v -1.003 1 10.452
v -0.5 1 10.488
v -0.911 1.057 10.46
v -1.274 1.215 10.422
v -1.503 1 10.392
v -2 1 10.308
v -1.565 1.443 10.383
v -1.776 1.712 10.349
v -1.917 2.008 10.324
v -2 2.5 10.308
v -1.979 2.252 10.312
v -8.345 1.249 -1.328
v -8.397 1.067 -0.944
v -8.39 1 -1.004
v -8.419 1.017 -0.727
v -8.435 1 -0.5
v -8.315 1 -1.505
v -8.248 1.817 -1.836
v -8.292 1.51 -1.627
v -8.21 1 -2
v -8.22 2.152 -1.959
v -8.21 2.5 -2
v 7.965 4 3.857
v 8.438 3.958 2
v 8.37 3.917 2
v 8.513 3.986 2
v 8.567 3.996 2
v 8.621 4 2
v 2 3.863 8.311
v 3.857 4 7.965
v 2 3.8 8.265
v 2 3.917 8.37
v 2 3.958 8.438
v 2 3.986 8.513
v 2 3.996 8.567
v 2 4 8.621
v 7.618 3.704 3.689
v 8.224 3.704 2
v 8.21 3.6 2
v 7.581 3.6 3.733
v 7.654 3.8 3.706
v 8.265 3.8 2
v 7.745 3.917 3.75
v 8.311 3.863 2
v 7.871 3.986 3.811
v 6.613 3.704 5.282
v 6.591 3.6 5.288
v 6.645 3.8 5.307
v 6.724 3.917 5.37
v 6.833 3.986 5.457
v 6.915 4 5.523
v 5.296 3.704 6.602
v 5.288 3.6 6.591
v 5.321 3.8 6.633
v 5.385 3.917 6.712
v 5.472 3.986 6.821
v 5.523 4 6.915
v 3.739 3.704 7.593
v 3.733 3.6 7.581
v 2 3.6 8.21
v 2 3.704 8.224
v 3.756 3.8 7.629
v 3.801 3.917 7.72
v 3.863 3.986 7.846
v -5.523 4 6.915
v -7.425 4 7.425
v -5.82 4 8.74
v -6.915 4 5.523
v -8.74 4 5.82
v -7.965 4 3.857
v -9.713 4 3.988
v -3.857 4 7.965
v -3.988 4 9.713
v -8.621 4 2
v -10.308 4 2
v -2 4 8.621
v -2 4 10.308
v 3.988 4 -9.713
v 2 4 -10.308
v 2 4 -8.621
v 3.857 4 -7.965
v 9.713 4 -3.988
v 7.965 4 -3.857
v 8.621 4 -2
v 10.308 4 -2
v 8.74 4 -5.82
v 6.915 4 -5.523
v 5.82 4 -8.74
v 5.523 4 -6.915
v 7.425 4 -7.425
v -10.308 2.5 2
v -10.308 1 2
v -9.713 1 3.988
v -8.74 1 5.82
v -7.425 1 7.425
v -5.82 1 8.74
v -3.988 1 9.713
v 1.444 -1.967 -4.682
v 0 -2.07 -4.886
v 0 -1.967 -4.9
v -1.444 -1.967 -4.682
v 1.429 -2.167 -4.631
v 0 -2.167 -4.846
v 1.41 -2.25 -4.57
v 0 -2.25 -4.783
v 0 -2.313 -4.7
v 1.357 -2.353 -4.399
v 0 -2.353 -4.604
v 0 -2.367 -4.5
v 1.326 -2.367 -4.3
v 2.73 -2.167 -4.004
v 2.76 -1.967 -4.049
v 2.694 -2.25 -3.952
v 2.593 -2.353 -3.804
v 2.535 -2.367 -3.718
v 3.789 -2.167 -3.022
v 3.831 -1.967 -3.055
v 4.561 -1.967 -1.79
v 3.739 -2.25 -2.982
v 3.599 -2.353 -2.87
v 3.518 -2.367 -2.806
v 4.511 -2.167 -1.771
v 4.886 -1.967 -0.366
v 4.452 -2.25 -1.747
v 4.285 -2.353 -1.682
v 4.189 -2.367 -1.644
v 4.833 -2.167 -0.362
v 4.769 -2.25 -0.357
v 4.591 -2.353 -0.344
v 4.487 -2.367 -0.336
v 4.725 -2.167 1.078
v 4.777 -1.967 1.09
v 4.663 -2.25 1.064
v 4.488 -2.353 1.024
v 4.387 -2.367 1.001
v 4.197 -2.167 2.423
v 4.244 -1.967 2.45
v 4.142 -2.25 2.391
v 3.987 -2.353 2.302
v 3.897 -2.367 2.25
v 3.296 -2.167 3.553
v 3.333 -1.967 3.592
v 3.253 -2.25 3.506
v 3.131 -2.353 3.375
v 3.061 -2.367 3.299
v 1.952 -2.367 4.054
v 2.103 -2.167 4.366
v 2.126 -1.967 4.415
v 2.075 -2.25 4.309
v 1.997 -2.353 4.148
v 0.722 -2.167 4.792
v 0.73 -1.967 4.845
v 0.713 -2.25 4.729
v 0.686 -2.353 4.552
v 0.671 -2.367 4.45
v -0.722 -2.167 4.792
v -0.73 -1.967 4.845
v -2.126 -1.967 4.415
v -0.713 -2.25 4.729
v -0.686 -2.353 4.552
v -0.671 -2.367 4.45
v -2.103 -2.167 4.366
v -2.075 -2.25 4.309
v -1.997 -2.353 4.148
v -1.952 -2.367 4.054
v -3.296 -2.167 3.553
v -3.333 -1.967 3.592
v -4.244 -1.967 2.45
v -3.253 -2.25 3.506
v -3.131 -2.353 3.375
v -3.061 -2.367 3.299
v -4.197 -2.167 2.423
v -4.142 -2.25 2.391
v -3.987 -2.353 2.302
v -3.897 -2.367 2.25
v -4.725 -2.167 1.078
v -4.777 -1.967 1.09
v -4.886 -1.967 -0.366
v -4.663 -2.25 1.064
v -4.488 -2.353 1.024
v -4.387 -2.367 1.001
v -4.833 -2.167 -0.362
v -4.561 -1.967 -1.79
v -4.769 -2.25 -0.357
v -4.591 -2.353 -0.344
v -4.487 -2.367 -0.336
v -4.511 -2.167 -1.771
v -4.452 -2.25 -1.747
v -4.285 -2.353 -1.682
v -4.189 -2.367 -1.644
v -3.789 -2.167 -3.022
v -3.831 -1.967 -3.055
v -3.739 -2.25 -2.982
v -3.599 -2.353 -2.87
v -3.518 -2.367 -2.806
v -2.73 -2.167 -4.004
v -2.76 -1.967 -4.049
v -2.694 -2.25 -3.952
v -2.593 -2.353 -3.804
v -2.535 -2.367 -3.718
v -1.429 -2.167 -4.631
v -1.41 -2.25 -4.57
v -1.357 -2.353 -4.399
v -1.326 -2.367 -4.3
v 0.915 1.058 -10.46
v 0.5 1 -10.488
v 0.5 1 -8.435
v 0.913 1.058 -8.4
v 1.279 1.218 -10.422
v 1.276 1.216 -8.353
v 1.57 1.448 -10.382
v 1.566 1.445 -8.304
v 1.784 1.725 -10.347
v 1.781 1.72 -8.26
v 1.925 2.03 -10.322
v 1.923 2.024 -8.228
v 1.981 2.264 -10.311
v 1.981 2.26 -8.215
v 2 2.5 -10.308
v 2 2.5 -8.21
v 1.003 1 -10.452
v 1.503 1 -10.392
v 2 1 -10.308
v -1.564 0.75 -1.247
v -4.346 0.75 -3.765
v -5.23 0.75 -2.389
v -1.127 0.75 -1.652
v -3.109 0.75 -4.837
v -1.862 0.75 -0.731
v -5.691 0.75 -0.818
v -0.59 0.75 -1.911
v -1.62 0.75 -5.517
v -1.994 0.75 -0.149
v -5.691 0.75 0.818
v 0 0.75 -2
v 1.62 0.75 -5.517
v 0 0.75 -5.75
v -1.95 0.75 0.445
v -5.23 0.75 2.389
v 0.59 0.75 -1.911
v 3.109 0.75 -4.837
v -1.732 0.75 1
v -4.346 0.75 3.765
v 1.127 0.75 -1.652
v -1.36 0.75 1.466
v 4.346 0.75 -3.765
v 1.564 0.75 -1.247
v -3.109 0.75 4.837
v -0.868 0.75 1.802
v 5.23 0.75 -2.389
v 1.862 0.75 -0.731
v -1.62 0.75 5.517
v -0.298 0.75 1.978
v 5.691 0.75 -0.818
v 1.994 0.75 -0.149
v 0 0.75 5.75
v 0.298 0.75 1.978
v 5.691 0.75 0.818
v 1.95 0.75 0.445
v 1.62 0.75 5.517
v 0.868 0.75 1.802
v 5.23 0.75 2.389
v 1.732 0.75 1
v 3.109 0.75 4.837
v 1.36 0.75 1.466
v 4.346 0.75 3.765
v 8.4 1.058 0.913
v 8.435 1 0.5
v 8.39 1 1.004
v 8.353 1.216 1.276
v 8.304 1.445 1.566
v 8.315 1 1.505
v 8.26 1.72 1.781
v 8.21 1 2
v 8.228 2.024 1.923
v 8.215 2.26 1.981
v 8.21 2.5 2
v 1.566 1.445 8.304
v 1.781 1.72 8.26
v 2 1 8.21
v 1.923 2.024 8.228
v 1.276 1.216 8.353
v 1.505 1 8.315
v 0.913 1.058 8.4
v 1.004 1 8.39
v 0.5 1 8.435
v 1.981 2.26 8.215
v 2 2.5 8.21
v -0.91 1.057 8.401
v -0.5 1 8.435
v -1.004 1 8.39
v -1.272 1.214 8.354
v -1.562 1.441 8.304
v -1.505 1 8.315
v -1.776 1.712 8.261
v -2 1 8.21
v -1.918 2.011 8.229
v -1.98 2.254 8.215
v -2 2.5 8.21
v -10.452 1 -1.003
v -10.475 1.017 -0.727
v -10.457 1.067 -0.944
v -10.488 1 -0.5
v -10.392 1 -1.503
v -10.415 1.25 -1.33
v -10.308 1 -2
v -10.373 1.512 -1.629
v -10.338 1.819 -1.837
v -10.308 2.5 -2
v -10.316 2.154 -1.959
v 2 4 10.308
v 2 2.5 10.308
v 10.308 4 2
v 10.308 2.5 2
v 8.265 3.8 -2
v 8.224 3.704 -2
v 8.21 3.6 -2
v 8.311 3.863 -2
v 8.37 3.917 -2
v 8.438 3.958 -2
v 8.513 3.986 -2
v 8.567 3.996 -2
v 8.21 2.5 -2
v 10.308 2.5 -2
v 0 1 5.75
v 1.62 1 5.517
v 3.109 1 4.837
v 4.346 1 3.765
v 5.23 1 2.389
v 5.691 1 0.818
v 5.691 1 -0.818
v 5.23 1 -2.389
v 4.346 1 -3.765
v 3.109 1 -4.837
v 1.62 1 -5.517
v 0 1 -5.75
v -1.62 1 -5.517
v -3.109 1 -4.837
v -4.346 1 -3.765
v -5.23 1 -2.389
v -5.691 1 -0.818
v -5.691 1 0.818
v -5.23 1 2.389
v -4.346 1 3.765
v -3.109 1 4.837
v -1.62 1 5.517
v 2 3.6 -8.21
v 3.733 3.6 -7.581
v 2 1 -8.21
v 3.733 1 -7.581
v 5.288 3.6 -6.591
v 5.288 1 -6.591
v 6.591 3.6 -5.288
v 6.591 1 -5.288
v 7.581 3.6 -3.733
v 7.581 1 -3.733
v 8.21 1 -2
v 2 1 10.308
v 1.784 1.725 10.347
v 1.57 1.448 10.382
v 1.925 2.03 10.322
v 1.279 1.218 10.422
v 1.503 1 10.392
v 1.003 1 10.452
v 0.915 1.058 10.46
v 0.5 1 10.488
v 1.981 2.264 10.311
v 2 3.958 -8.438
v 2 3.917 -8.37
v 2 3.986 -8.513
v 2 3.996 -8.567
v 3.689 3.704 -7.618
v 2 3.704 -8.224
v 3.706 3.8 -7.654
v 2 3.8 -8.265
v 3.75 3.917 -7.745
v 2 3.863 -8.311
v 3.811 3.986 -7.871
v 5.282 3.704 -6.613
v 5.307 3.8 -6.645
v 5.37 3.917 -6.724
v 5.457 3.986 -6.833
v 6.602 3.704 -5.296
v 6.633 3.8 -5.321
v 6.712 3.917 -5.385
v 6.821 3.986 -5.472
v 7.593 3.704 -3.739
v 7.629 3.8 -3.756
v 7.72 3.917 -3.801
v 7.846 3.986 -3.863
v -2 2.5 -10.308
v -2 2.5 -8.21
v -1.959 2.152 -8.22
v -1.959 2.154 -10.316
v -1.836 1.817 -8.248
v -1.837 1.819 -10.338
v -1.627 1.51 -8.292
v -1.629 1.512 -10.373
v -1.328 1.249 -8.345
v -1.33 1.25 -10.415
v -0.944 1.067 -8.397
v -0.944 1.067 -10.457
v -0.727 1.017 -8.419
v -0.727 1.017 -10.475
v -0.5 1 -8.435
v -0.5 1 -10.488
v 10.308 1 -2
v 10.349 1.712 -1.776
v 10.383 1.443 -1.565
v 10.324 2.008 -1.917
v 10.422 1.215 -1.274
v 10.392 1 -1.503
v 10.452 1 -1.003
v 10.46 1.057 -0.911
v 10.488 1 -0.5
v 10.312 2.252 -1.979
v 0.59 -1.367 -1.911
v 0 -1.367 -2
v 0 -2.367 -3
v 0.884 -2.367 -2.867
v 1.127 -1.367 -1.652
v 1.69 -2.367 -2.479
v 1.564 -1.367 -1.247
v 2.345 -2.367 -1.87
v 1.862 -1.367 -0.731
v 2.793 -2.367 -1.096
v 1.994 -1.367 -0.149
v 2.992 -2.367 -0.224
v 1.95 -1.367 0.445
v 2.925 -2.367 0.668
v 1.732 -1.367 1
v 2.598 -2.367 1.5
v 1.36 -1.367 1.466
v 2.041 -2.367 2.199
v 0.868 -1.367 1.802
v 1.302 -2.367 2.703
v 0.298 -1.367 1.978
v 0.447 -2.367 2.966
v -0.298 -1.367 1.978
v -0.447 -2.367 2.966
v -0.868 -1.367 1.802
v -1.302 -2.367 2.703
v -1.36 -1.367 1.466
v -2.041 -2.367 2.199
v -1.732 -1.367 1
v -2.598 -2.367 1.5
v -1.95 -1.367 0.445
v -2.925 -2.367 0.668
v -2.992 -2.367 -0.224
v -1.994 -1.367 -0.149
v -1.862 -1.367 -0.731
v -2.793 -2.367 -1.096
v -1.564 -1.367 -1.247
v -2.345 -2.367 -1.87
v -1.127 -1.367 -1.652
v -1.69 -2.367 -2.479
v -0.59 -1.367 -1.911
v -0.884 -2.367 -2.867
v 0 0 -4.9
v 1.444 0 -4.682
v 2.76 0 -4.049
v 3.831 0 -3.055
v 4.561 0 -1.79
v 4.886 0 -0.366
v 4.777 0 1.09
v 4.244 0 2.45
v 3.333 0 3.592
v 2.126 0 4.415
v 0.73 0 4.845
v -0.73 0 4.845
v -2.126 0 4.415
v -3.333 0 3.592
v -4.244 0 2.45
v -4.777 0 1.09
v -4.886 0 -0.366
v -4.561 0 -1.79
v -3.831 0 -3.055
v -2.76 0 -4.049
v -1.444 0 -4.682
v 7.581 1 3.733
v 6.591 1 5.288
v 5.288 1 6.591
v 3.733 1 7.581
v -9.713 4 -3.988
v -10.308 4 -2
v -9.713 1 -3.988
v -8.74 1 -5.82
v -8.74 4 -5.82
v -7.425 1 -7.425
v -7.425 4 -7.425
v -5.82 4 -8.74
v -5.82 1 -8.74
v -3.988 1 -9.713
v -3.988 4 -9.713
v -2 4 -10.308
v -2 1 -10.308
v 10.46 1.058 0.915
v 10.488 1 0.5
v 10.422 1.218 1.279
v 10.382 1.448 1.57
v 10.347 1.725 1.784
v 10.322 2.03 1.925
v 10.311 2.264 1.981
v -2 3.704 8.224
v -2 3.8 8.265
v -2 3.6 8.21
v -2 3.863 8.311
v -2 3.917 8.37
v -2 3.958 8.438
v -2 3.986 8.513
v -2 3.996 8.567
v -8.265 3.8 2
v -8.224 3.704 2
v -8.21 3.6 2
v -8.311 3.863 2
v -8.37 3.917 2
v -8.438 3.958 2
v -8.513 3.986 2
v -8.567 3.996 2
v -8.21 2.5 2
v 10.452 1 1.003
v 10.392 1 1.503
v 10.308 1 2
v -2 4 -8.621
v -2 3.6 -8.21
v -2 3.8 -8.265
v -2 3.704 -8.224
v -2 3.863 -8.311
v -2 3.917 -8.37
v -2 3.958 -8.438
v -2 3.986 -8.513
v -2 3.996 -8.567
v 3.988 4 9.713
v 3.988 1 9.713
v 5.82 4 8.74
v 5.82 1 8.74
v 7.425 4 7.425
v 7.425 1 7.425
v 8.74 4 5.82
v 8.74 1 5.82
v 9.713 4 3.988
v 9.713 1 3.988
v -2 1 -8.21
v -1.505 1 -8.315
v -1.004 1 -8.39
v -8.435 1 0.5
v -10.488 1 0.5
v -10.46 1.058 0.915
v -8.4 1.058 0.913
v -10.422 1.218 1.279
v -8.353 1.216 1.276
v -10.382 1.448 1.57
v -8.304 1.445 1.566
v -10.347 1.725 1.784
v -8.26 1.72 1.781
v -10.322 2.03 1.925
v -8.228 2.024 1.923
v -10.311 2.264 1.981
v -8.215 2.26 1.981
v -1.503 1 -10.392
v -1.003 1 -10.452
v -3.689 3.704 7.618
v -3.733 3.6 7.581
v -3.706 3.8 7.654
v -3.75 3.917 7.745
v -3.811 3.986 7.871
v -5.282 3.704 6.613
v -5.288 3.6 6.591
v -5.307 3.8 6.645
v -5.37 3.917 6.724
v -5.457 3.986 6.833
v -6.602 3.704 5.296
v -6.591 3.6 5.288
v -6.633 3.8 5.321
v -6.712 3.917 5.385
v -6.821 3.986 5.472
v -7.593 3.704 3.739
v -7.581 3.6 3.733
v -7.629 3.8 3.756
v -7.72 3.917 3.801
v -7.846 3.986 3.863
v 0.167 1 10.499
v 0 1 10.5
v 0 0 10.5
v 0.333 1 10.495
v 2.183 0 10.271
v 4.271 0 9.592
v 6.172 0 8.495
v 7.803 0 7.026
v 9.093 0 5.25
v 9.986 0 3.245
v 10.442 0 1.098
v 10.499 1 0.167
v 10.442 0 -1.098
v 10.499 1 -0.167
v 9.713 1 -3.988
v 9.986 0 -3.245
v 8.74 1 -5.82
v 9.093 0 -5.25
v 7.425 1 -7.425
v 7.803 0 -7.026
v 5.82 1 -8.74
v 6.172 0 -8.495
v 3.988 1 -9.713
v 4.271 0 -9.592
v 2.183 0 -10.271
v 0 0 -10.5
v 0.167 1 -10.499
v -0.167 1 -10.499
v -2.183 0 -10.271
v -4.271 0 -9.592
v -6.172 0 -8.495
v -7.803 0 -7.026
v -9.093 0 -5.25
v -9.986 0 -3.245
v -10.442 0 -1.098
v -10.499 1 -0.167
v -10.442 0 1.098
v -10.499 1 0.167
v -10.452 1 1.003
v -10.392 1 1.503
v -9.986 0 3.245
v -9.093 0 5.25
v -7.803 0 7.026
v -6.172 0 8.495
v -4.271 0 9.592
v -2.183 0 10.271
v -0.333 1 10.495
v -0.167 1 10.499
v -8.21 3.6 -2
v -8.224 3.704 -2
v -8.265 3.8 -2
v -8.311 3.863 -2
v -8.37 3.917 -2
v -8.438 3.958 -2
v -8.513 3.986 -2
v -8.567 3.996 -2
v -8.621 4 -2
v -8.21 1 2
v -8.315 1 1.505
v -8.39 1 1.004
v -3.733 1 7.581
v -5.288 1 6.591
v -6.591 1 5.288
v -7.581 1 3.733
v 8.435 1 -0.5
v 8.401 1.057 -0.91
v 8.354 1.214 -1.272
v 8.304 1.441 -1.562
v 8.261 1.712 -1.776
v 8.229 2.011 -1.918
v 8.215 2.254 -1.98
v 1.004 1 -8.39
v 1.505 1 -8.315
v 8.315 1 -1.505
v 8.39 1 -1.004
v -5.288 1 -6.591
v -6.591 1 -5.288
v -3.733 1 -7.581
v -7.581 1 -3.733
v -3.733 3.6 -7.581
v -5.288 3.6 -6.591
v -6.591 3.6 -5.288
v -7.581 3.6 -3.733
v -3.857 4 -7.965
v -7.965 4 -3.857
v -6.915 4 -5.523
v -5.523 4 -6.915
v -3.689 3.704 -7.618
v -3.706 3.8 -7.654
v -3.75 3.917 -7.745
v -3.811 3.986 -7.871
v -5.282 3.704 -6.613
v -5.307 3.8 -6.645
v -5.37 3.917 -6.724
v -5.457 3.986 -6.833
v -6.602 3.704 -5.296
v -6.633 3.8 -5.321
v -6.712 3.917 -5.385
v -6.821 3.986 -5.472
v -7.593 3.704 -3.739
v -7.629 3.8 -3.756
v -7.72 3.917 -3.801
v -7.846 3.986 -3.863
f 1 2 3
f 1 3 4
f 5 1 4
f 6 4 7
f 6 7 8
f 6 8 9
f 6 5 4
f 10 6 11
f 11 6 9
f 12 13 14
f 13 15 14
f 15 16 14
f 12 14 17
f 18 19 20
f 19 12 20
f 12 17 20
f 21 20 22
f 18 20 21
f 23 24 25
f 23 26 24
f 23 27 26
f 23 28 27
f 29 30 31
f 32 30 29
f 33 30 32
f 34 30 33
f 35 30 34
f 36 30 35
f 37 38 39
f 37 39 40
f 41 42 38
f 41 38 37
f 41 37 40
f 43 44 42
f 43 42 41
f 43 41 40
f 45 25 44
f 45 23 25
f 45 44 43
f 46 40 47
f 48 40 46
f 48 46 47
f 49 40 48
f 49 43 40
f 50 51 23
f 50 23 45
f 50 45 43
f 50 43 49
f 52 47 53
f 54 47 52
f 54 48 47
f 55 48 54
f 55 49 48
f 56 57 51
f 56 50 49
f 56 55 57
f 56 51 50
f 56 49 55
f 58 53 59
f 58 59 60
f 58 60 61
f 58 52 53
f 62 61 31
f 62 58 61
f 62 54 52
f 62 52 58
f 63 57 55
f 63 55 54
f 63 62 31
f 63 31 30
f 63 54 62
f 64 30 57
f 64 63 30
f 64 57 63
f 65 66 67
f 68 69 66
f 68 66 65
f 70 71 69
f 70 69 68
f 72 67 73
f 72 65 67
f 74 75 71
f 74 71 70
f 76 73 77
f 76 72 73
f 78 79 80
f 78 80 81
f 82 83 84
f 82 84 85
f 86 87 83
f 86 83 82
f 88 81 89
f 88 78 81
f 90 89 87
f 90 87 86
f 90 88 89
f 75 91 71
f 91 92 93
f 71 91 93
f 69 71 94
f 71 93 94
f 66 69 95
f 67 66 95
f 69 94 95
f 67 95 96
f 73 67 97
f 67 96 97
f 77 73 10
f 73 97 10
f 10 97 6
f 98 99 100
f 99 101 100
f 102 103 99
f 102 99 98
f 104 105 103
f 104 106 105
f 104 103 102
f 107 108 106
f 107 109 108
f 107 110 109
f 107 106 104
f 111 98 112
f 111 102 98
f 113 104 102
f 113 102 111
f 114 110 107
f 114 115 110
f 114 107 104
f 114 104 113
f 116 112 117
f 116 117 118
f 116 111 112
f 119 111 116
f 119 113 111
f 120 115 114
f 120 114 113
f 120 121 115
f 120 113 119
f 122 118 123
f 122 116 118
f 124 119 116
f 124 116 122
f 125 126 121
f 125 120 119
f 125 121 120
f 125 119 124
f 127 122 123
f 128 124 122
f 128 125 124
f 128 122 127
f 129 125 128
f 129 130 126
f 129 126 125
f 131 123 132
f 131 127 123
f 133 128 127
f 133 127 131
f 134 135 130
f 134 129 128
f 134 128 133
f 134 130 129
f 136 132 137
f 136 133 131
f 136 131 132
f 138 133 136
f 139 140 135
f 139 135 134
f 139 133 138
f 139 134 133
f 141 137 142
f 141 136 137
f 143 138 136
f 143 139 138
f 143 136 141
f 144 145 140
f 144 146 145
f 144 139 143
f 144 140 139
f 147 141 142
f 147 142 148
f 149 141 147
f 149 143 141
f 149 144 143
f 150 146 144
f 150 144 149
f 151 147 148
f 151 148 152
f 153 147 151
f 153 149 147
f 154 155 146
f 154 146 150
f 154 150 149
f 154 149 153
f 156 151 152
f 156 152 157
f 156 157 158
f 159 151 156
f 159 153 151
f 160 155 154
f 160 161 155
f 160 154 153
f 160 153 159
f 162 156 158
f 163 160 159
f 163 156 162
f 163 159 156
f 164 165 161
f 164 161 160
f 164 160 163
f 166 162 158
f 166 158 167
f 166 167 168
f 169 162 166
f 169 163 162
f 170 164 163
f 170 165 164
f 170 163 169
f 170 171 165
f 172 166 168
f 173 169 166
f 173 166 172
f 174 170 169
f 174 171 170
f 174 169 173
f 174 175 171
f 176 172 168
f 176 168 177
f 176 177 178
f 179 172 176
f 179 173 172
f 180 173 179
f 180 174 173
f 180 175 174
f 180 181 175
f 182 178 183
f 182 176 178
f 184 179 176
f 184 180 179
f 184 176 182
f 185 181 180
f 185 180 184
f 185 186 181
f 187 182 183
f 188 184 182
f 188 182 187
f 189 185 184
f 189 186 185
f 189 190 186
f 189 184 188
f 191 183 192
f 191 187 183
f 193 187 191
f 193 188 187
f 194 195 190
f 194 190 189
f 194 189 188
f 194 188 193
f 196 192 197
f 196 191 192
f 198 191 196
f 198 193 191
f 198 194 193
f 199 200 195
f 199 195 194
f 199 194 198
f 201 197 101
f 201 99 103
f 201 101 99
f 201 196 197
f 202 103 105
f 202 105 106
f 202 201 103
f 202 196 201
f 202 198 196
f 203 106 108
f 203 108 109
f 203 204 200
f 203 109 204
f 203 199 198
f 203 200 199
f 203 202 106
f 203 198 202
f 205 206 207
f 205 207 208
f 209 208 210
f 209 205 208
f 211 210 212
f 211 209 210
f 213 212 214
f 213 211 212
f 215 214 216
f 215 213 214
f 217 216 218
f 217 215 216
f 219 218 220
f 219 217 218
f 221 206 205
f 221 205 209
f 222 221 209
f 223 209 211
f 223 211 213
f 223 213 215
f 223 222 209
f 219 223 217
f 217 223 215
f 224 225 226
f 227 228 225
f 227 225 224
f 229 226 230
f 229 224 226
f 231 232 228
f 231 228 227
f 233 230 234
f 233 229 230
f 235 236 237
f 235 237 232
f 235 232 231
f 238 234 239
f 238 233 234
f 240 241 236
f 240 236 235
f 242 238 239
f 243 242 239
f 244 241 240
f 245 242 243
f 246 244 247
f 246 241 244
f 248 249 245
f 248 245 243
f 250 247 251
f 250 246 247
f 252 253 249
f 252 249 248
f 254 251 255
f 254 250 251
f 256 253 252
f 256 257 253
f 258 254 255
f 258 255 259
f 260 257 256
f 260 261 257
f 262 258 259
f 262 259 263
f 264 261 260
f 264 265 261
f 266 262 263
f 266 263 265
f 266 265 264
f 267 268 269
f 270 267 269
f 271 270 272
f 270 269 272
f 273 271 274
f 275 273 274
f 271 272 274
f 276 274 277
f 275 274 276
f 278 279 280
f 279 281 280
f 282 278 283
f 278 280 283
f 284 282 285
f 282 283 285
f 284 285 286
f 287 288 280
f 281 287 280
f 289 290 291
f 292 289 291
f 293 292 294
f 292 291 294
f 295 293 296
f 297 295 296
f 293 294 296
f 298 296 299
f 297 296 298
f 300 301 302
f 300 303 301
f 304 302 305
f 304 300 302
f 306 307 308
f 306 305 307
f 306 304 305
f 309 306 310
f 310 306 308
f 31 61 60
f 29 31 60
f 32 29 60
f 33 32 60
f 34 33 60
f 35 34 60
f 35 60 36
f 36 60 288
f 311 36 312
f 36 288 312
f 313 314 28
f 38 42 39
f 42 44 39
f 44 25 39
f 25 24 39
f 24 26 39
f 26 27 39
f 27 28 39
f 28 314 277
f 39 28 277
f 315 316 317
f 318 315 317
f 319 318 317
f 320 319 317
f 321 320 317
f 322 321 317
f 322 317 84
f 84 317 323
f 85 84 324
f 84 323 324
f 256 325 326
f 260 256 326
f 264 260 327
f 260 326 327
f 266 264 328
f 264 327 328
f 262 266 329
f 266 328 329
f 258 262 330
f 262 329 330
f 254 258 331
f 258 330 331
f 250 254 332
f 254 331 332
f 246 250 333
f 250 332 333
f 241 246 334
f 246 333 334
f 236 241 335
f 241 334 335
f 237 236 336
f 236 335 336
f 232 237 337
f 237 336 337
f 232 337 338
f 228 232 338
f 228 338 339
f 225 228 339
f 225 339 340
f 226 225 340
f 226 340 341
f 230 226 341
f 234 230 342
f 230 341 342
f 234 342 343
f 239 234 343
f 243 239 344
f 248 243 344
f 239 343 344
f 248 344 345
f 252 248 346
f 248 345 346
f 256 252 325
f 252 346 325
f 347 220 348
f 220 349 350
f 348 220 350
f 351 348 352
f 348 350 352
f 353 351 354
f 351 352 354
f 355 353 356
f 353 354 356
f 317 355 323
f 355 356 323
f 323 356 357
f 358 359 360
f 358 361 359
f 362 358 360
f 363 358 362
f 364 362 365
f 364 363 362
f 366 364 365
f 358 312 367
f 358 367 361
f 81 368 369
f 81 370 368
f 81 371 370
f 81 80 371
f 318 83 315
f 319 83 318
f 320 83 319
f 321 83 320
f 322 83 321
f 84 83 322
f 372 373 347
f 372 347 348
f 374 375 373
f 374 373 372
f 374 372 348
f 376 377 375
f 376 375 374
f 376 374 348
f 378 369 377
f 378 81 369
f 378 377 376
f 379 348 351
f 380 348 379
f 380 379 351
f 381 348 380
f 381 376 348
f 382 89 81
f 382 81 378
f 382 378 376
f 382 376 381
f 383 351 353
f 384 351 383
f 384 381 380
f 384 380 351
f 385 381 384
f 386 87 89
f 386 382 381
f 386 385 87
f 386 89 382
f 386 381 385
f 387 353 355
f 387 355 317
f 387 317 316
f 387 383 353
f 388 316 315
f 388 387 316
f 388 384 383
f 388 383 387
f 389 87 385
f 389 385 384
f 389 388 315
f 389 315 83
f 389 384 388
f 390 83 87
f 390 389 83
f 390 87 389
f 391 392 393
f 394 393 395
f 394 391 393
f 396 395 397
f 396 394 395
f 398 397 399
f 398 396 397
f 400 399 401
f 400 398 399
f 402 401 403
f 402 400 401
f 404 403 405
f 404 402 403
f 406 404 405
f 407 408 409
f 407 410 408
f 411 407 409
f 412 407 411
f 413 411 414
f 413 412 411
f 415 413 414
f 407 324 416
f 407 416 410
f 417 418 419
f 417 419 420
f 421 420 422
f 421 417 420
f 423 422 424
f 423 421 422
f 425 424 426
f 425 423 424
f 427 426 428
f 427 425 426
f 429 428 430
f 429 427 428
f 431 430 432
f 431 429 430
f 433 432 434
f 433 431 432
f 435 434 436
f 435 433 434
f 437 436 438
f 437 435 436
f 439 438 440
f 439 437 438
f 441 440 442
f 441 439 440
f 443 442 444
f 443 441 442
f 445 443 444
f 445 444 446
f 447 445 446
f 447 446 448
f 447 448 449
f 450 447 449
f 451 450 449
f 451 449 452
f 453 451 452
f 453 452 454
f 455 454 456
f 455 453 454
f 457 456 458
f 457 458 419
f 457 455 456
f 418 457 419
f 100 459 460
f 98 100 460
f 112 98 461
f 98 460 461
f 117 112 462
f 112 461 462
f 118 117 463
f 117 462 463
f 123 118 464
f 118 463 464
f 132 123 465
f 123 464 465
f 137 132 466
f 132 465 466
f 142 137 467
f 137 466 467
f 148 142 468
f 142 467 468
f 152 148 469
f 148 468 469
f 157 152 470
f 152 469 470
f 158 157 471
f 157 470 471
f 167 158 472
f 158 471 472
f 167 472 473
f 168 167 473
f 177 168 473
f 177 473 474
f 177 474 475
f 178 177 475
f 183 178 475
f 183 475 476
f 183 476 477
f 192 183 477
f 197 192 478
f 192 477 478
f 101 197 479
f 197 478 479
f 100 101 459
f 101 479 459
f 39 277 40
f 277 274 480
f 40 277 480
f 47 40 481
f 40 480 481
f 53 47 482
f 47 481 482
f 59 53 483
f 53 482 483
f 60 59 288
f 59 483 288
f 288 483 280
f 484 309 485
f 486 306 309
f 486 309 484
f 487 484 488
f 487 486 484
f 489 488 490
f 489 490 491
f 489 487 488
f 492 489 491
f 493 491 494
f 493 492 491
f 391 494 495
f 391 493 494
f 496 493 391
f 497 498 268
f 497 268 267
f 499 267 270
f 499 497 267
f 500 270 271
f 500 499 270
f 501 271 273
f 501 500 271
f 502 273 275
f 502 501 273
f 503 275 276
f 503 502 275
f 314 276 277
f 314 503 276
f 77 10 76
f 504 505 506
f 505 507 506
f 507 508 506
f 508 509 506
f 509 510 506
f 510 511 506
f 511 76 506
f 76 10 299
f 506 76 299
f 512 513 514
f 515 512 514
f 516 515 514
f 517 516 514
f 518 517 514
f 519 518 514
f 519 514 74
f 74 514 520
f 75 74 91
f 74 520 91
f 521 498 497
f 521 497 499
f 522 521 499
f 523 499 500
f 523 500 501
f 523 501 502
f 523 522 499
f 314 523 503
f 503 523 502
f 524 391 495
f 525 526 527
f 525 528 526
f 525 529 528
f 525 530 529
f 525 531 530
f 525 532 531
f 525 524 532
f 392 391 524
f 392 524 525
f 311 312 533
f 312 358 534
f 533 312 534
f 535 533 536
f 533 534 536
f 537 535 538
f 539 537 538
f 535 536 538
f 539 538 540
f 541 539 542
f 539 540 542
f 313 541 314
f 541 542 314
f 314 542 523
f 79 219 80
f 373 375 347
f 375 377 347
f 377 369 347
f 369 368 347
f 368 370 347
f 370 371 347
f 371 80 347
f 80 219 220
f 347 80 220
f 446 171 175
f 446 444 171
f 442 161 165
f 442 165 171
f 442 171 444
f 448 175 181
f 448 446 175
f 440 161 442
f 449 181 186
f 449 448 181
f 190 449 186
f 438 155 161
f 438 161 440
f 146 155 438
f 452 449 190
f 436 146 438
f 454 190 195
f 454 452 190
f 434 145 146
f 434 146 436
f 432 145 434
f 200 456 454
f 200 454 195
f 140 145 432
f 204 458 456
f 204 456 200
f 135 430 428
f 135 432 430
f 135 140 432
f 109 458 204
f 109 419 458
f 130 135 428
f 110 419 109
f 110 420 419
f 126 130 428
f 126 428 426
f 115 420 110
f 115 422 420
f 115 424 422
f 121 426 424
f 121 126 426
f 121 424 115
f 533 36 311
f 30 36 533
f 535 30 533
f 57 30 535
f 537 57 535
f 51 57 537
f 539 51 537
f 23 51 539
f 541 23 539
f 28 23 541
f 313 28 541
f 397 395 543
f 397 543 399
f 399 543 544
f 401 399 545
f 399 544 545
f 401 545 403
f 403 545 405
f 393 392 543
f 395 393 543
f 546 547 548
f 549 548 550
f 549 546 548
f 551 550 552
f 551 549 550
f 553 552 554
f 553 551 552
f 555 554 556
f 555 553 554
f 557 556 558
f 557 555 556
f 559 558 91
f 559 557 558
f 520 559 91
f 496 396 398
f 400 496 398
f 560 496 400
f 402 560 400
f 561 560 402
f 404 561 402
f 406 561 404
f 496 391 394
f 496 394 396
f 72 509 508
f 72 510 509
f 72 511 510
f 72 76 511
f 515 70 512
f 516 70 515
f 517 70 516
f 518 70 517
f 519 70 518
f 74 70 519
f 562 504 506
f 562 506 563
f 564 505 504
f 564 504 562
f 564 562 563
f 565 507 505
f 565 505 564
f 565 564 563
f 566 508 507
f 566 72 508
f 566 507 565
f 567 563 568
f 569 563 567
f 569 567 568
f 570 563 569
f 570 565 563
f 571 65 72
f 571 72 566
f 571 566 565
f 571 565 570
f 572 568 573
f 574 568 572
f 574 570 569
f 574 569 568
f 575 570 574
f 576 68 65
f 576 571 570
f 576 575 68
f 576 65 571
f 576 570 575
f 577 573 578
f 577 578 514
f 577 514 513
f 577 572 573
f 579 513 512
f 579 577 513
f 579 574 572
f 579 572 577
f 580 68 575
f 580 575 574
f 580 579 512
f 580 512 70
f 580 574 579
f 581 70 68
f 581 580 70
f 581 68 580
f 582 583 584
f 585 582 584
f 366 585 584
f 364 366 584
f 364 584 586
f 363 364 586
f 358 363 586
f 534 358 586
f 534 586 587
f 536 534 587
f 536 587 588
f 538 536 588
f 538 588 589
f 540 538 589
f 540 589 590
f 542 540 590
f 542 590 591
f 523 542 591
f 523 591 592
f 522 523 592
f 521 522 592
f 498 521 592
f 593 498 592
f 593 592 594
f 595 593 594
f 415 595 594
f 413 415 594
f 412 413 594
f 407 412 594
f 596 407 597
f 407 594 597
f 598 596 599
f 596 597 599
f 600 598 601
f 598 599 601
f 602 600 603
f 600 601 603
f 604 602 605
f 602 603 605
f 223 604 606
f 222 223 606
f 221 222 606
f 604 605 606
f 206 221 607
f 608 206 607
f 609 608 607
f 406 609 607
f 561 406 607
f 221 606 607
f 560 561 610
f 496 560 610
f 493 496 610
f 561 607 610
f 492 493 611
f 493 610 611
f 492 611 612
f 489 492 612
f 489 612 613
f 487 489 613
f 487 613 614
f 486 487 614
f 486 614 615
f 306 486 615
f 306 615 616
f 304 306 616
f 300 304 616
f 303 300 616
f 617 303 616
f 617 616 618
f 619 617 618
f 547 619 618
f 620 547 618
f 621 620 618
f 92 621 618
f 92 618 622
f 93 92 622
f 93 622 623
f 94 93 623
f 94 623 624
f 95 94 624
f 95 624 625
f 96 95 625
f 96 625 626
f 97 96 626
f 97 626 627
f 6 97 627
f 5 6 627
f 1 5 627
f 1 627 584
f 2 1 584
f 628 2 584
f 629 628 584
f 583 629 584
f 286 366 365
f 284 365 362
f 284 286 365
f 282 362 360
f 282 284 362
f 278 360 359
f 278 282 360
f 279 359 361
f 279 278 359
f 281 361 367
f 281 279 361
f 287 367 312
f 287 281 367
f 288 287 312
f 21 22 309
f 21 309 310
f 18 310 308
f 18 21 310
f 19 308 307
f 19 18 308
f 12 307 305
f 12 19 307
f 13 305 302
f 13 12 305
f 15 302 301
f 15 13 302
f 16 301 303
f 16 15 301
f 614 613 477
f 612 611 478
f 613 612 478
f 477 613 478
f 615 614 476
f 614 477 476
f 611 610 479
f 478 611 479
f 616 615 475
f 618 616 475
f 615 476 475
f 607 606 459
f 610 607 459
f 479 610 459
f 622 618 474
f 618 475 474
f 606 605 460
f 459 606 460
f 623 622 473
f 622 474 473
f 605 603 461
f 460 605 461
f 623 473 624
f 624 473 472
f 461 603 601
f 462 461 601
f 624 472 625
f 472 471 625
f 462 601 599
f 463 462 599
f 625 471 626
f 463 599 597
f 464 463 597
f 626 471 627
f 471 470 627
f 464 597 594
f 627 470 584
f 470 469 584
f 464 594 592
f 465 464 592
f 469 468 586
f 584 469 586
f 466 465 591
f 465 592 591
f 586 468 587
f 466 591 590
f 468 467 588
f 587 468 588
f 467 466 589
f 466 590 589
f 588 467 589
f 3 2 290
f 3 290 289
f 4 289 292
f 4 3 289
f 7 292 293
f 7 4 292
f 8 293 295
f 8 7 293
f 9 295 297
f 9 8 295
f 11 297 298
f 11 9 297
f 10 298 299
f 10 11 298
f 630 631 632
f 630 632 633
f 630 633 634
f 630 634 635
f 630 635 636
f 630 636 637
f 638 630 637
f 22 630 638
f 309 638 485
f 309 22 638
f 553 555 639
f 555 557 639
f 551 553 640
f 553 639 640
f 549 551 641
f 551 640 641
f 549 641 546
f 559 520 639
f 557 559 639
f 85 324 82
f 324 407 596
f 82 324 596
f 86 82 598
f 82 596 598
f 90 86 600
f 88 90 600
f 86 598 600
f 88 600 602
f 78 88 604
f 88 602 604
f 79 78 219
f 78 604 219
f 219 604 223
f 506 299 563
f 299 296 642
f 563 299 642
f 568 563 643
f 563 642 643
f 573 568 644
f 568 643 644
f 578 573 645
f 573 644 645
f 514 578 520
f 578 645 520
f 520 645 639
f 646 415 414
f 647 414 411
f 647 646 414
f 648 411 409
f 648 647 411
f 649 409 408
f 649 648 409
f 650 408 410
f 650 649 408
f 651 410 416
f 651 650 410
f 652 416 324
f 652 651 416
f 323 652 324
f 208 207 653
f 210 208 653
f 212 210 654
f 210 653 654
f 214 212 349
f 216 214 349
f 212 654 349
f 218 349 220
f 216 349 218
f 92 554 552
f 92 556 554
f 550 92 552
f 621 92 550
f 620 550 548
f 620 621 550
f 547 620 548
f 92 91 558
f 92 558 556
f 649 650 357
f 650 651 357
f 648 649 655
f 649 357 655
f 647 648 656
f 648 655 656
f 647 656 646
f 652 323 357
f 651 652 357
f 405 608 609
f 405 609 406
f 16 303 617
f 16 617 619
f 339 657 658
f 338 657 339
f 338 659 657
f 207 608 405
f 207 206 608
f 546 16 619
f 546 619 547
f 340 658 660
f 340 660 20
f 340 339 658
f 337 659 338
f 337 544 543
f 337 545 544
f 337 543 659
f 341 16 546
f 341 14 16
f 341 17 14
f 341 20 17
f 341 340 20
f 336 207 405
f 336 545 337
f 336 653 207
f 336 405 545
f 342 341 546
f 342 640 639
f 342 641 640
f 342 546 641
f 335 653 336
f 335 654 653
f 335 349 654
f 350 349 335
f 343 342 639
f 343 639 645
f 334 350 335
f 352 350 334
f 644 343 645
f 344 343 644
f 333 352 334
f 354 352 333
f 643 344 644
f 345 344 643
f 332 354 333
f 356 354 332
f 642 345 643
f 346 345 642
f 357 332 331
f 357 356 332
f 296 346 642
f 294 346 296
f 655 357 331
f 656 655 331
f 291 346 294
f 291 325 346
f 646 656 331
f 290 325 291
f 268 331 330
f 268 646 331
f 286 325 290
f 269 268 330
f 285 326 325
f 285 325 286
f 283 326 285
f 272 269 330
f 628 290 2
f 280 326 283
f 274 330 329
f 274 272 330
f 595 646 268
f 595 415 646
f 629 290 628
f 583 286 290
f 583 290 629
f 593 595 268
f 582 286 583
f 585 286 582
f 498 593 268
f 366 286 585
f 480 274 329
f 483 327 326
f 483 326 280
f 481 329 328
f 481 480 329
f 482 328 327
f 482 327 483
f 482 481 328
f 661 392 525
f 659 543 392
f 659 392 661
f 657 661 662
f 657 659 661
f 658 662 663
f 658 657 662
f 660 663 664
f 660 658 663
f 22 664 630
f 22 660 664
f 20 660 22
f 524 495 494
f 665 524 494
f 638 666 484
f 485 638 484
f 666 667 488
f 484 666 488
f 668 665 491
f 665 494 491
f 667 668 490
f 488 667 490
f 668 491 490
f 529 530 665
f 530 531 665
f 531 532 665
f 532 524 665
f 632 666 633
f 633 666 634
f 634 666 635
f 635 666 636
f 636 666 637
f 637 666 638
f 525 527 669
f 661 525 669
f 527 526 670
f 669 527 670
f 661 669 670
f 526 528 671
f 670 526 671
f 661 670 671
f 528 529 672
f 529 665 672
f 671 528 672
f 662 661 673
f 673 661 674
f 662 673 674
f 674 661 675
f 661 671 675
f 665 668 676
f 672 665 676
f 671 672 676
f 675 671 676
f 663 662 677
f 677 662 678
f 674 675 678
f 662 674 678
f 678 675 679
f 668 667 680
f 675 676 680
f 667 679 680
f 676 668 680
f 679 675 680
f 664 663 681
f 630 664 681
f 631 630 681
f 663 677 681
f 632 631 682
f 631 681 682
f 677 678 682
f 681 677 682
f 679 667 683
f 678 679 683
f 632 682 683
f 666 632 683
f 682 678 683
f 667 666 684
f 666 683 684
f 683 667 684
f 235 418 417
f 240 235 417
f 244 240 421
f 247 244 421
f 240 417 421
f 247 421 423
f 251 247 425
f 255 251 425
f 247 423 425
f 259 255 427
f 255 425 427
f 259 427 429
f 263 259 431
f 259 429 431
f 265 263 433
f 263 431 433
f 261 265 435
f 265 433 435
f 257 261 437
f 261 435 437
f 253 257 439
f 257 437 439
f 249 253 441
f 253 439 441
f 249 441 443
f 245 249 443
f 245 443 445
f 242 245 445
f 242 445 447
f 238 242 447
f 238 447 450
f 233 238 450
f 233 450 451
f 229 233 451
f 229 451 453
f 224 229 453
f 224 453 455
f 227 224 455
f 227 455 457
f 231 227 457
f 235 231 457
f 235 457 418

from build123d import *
from build123d.topology import SkipClean

# Parameters (mm, degrees)
SKETCH1_R      = 10.5
EXTRUDE1_DEPTH = 1
EXTRUDE6_DEPTH = 3
SKETCH9_R      = 5.75
EXTRUDE9_DEPTH = 0.25
SKETCH7_R      = 4.9
EXTRUDE7_DEPTH = 2.366666667
SKETCH8_R      = 2
EXTRUDE8_DEPTH = 17.156560415
FILLET2_R      = 0.4
CHAMFER2_SIZE  = 1
FILLET3_R      = 1.5


with BuildPart() as part:
    # Sketch1 → Extrude1 (new body)
    with BuildSketch(Plane(origin=(0, 0, 0), x_dir=(1, 0, 0), z_dir=(0, 1, 0))):
        with Locations(Location((0, 0, 0), (0, 0, 270))):
            Circle(SKETCH1_R)
    extrude(amount=EXTRUDE1_DEPTH)

    # Sketch6 → Extrude6 (add)
    with SkipClean():  # the faces are left unmerged after this step: merging them gives an invalid solid
        with BuildSketch(Plane(origin=(0, 1, 0), x_dir=(1, 0, 0), z_dir=(0, 1, 0))):
            with BuildLine():
                Line((-2, 10.307764064), (-2, 8.209902557))
                ThreePointArc((-2, 8.209902557), (-5.975052301, 5.975052301), (-8.209902557, 2))
                Line((-8.209902557, 2), (-10.307764064, 2))
                ThreePointArc((-10.307764064, 2), (-7.424621202, 7.424621202), (-2, 10.307764064))
            make_face()
            with BuildLine():
                Line((2, 10.307764064), (2, 8.209902557))
                ThreePointArc((2, 8.209902557), (5.975052301, 5.975052301), (8.209902557, 2))
                Line((8.209902557, 2), (10.307764064, 2))
                ThreePointArc((10.307764064, 2), (7.424621202, 7.424621202), (2, 10.307764064))
            make_face()
            with BuildLine():
                Line((10.307764064, -2), (8.209902557, -2))
                ThreePointArc((8.209902557, -2), (5.975052301, -5.975052301), (2, -8.209902557))
                Line((2, -8.209902557), (2, -10.307764064))
                ThreePointArc((2, -10.307764064), (7.424621202, -7.424621202), (10.307764064, -2))
            make_face()
            with BuildLine():
                Line((-2, -10.307764064), (-2, -8.209902557))
                ThreePointArc((-2, -8.209902557), (-5.975052301, -5.975052301), (-8.209902557, -2))
                Line((-8.209902557, -2), (-10.307764064, -2))
                ThreePointArc((-10.307764064, -2), (-7.424621202, -7.424621202), (-2, -10.307764064))
            make_face()
        extrude(amount=EXTRUDE6_DEPTH)

    # Sketch9 → Extrude9 (cut)
    with SkipClean():  # the faces are left unmerged after this step: merging them gives an invalid solid
        with BuildSketch(Plane(origin=(0, 1, 0), x_dir=(1, 0, 0), z_dir=(0, 1, 0))):
            with Locations(Location((0, 0, 0), (0, 0, 270))):
                Circle(SKETCH9_R)
        extrude(amount=-EXTRUDE9_DEPTH, mode=Mode.SUBTRACT)

    # Sketch7 → Extrude7 (add)
    with SkipClean():  # the faces are left unmerged after this step: merging them gives an invalid solid
        with BuildSketch(Plane.XZ):
            with Locations(Location((0, 0, 0), (0, 0, 270))):
                Circle(SKETCH7_R)
        extrude(amount=EXTRUDE7_DEPTH)

    # Sketch8 → Extrude8 (cut, through all)
    with SkipClean():  # the faces are left unmerged after this step: merging them gives an invalid solid
        with BuildSketch(Plane.XZ.offset(2.366666667)):
            with Locations(Location((0, 0, 0), (0, 0, 270))):
                Circle(SKETCH8_R)
        extrude(amount=-EXTRUDE8_DEPTH, mode=Mode.SUBTRACT)

    # Fillet2
    fillet2_edges = [part.edges().sort_by_distance(p)[0] for p in [
        (5.975052301, 4, -5.975052301),
        (5.975052301, 4, 5.975052301),
        (-5.975052301, 4, 5.975052301),
        (0, -2.366666667, 4.9),
        (-5.975052301, 4, -5.975052301),
    ]]
    fillet(fillet2_edges, radius=FILLET2_R)

    # Chamfer2
    chamfer2_edges = [part.edges().sort_by_distance(p)[0] for p in [
        (0, -2.366666667, 2),
    ]]
    chamfer(chamfer2_edges, length=CHAMFER2_SIZE)

    # Fillet3
    # the kernel refuses this fillet: 1.5 mm, written as the material it adds along each edge
    with BuildSketch(Plane(origin=(2, 1, -14.057764064), x_dir=(-1, 0, 0), z_dir=(0, 0, 1))) as fillet3_piece_1_section:
        with BuildLine():
            CenterArc((FILLET3_R, -FILLET3_R), FILLET3_R, 90, 90)
            Line((0, -FILLET3_R), (0, 0))
            Line((0, 0), (FILLET3_R, 0))
        make_face()
    fillet3_piece_1 = extrude(amount=9.597861507, mode=Mode.PRIVATE)
    fillet3_piece_1 = fillet3_piece_1 & Plane(origin=(0, 1.340711746, 0), x_dir=(0, 0, 1), z_dir=(0, -1, 0)) * Cylinder(10.5, 26, mode=Mode.PRIVATE)
    fillet3_piece_1 = fillet3_piece_1 - Plane(origin=(0, 1.340711746, 0), x_dir=(0.23668639053254556, 0, -0.9715861014530186), z_dir=(0, -1, 0)) * Cylinder(8.45, 26, mode=Mode.PRIVATE)
    with BuildSketch(Plane(origin=(4.459902557, 1, -2), x_dir=(0, 0, 1), z_dir=(1, 0, 0))) as fillet3_piece_2_section:
        with BuildLine():
            CenterArc((FILLET3_R, -FILLET3_R), FILLET3_R, 90, 90)
            Line((0, -FILLET3_R), (0, 0))
            Line((0, 0), (FILLET3_R, 0))
        make_face()
    fillet3_piece_2 = extrude(amount=9.597861507, mode=Mode.PRIVATE)
    fillet3_piece_2 = fillet3_piece_2 & Plane(origin=(0, 1.34071094, 0), x_dir=(0, 0, 1), z_dir=(0, -1, 0)) * Cylinder(10.5, 26, mode=Mode.PRIVATE)
    fillet3_piece_2 = fillet3_piece_2 - Plane(origin=(0, 1.34071094, 0), x_dir=(0.23668639053254556, 0, -0.9715861014530186), z_dir=(0, -1, 0)) * Cylinder(8.45, 26, mode=Mode.PRIVATE)
    with BuildSketch(Plane(origin=(14.057764064, 1, 2), x_dir=(0, 0, -1), z_dir=(-1, 0, 0))) as fillet3_piece_3_section:
        with BuildLine():
            CenterArc((FILLET3_R, -FILLET3_R), FILLET3_R, 90, 90)
            Line((0, -FILLET3_R), (0, 0))
            Line((0, 0), (FILLET3_R, 0))
        make_face()
    fillet3_piece_3 = extrude(amount=9.597861507, mode=Mode.PRIVATE)
    fillet3_piece_3 = fillet3_piece_3 & Plane(origin=(0, 1.340711718, 0), x_dir=(0, 0, 1), z_dir=(0, -1, 0)) * Cylinder(10.5, 26, mode=Mode.PRIVATE)
    fillet3_piece_3 = fillet3_piece_3 - Plane(origin=(0, 1.340711718, 0), x_dir=(0.9715861014530187, 0, 0.2366863905325454), z_dir=(0, -1, 0)) * Cylinder(8.45, 26, mode=Mode.PRIVATE)
    with BuildSketch(Plane(origin=(2, 1, 4.459902557), x_dir=(-1, 0, 0), z_dir=(0, 0, 1))) as fillet3_piece_4_section:
        with BuildLine():
            CenterArc((FILLET3_R, -FILLET3_R), FILLET3_R, 90, 90)
            Line((0, -FILLET3_R), (0, 0))
            Line((0, 0), (FILLET3_R, 0))
        make_face()
    fillet3_piece_4 = extrude(amount=9.597861507, mode=Mode.PRIVATE)
    fillet3_piece_4 = fillet3_piece_4 & Plane(origin=(0, 1.34071094, 0), x_dir=(0, 0, 1), z_dir=(0, -1, 0)) * Cylinder(10.5, 26, mode=Mode.PRIVATE)
    fillet3_piece_4 = fillet3_piece_4 - Plane(origin=(0, 1.34071094, 0), x_dir=(0.9715861014530187, 0, 0.2366863905325454), z_dir=(0, -1, 0)) * Cylinder(8.45, 26, mode=Mode.PRIVATE)
    with BuildSketch(Plane(origin=(-2, 1, 14.057764064), x_dir=(1, 0, 0), z_dir=(0, 0, -1))) as fillet3_piece_5_section:
        with BuildLine():
            CenterArc((FILLET3_R, -FILLET3_R), FILLET3_R, 90, 90)
            Line((0, -FILLET3_R), (0, 0))
            Line((0, 0), (FILLET3_R, 0))
        make_face()
    fillet3_piece_5 = extrude(amount=9.597861507, mode=Mode.PRIVATE)
    fillet3_piece_5 = fillet3_piece_5 & Plane(origin=(0, 1.340711184, 0), x_dir=(0, 0, 1), z_dir=(0, -1, 0)) * Cylinder(10.5, 26, mode=Mode.PRIVATE)
    fillet3_piece_5 = fillet3_piece_5 - Plane(origin=(0, 1.340711184, 0), x_dir=(-0.2366863905325458, 0, 0.9715861014530186), z_dir=(0, -1, 0)) * Cylinder(8.45, 26, mode=Mode.PRIVATE)
    with BuildSketch(Plane(origin=(-4.459902557, 1, 2), x_dir=(0, 0, -1), z_dir=(-1, 0, 0))) as fillet3_piece_6_section:
        with BuildLine():
            CenterArc((FILLET3_R, -FILLET3_R), FILLET3_R, 90, 90)
            Line((0, -FILLET3_R), (0, 0))
            Line((0, 0), (FILLET3_R, 0))
        make_face()
    fillet3_piece_6 = extrude(amount=9.597861507, mode=Mode.PRIVATE)
    fillet3_piece_6 = fillet3_piece_6 & Plane(origin=(0, 1.34071094, 0), x_dir=(0, 0, 1), z_dir=(0, -1, 0)) * Cylinder(10.5, 26, mode=Mode.PRIVATE)
    fillet3_piece_6 = fillet3_piece_6 - Plane(origin=(0, 1.34071094, 0), x_dir=(-0.2366863905325458, 0, 0.9715861014530186), z_dir=(0, -1, 0)) * Cylinder(8.45, 26, mode=Mode.PRIVATE)
    with BuildSketch(Plane(origin=(-4.459902557, 1, -2), x_dir=(0, 0, 1), z_dir=(-1, 0, 0))) as fillet3_piece_7_section:
        with BuildLine():
            CenterArc((FILLET3_R, FILLET3_R), FILLET3_R, 180, 90)
            Line((0, FILLET3_R), (0, 0))
            Line((0, 0), (FILLET3_R, 0))
        make_face()
    fillet3_piece_7 = extrude(amount=9.597861507, mode=Mode.PRIVATE)
    fillet3_piece_7 = fillet3_piece_7 & Plane(origin=(0, 1.340712249, 0), x_dir=(0, 0, 1), z_dir=(0, -1, 0)) * Cylinder(10.5, 26, mode=Mode.PRIVATE)
    fillet3_piece_7 = fillet3_piece_7 - Plane(origin=(0, 1.340712249, 0), x_dir=(-0.23668639053254495, 0, -0.9715861014530188), z_dir=(0, -1, 0)) * Cylinder(8.45, 26, mode=Mode.PRIVATE)
    with BuildSketch(Plane(origin=(-2, 1, -14.057764064), x_dir=(1, 0, 0), z_dir=(0, 0, 1))) as fillet3_piece_8_section:
        with BuildLine():
            CenterArc((FILLET3_R, FILLET3_R), FILLET3_R, 180, 90)
            Line((0, FILLET3_R), (0, 0))
            Line((0, 0), (FILLET3_R, 0))
        make_face()
    fillet3_piece_8 = extrude(amount=9.597861507, mode=Mode.PRIVATE)
    fillet3_piece_8 = fillet3_piece_8 & Plane(origin=(0, 1.340709875, 0), x_dir=(0, 0, 1), z_dir=(0, -1, 0)) * Cylinder(10.5, 26, mode=Mode.PRIVATE)
    fillet3_piece_8 = fillet3_piece_8 - Plane(origin=(0, 1.340709875, 0), x_dir=(-0.23668639053254495, 0, -0.9715861014530188), z_dir=(0, -1, 0)) * Cylinder(8.45, 26, mode=Mode.PRIVATE)
    add([fillet3_piece_1, fillet3_piece_2, fillet3_piece_3, fillet3_piece_4, fillet3_piece_5, fillet3_piece_6, fillet3_piece_7, fillet3_piece_8])


solid = part.part
